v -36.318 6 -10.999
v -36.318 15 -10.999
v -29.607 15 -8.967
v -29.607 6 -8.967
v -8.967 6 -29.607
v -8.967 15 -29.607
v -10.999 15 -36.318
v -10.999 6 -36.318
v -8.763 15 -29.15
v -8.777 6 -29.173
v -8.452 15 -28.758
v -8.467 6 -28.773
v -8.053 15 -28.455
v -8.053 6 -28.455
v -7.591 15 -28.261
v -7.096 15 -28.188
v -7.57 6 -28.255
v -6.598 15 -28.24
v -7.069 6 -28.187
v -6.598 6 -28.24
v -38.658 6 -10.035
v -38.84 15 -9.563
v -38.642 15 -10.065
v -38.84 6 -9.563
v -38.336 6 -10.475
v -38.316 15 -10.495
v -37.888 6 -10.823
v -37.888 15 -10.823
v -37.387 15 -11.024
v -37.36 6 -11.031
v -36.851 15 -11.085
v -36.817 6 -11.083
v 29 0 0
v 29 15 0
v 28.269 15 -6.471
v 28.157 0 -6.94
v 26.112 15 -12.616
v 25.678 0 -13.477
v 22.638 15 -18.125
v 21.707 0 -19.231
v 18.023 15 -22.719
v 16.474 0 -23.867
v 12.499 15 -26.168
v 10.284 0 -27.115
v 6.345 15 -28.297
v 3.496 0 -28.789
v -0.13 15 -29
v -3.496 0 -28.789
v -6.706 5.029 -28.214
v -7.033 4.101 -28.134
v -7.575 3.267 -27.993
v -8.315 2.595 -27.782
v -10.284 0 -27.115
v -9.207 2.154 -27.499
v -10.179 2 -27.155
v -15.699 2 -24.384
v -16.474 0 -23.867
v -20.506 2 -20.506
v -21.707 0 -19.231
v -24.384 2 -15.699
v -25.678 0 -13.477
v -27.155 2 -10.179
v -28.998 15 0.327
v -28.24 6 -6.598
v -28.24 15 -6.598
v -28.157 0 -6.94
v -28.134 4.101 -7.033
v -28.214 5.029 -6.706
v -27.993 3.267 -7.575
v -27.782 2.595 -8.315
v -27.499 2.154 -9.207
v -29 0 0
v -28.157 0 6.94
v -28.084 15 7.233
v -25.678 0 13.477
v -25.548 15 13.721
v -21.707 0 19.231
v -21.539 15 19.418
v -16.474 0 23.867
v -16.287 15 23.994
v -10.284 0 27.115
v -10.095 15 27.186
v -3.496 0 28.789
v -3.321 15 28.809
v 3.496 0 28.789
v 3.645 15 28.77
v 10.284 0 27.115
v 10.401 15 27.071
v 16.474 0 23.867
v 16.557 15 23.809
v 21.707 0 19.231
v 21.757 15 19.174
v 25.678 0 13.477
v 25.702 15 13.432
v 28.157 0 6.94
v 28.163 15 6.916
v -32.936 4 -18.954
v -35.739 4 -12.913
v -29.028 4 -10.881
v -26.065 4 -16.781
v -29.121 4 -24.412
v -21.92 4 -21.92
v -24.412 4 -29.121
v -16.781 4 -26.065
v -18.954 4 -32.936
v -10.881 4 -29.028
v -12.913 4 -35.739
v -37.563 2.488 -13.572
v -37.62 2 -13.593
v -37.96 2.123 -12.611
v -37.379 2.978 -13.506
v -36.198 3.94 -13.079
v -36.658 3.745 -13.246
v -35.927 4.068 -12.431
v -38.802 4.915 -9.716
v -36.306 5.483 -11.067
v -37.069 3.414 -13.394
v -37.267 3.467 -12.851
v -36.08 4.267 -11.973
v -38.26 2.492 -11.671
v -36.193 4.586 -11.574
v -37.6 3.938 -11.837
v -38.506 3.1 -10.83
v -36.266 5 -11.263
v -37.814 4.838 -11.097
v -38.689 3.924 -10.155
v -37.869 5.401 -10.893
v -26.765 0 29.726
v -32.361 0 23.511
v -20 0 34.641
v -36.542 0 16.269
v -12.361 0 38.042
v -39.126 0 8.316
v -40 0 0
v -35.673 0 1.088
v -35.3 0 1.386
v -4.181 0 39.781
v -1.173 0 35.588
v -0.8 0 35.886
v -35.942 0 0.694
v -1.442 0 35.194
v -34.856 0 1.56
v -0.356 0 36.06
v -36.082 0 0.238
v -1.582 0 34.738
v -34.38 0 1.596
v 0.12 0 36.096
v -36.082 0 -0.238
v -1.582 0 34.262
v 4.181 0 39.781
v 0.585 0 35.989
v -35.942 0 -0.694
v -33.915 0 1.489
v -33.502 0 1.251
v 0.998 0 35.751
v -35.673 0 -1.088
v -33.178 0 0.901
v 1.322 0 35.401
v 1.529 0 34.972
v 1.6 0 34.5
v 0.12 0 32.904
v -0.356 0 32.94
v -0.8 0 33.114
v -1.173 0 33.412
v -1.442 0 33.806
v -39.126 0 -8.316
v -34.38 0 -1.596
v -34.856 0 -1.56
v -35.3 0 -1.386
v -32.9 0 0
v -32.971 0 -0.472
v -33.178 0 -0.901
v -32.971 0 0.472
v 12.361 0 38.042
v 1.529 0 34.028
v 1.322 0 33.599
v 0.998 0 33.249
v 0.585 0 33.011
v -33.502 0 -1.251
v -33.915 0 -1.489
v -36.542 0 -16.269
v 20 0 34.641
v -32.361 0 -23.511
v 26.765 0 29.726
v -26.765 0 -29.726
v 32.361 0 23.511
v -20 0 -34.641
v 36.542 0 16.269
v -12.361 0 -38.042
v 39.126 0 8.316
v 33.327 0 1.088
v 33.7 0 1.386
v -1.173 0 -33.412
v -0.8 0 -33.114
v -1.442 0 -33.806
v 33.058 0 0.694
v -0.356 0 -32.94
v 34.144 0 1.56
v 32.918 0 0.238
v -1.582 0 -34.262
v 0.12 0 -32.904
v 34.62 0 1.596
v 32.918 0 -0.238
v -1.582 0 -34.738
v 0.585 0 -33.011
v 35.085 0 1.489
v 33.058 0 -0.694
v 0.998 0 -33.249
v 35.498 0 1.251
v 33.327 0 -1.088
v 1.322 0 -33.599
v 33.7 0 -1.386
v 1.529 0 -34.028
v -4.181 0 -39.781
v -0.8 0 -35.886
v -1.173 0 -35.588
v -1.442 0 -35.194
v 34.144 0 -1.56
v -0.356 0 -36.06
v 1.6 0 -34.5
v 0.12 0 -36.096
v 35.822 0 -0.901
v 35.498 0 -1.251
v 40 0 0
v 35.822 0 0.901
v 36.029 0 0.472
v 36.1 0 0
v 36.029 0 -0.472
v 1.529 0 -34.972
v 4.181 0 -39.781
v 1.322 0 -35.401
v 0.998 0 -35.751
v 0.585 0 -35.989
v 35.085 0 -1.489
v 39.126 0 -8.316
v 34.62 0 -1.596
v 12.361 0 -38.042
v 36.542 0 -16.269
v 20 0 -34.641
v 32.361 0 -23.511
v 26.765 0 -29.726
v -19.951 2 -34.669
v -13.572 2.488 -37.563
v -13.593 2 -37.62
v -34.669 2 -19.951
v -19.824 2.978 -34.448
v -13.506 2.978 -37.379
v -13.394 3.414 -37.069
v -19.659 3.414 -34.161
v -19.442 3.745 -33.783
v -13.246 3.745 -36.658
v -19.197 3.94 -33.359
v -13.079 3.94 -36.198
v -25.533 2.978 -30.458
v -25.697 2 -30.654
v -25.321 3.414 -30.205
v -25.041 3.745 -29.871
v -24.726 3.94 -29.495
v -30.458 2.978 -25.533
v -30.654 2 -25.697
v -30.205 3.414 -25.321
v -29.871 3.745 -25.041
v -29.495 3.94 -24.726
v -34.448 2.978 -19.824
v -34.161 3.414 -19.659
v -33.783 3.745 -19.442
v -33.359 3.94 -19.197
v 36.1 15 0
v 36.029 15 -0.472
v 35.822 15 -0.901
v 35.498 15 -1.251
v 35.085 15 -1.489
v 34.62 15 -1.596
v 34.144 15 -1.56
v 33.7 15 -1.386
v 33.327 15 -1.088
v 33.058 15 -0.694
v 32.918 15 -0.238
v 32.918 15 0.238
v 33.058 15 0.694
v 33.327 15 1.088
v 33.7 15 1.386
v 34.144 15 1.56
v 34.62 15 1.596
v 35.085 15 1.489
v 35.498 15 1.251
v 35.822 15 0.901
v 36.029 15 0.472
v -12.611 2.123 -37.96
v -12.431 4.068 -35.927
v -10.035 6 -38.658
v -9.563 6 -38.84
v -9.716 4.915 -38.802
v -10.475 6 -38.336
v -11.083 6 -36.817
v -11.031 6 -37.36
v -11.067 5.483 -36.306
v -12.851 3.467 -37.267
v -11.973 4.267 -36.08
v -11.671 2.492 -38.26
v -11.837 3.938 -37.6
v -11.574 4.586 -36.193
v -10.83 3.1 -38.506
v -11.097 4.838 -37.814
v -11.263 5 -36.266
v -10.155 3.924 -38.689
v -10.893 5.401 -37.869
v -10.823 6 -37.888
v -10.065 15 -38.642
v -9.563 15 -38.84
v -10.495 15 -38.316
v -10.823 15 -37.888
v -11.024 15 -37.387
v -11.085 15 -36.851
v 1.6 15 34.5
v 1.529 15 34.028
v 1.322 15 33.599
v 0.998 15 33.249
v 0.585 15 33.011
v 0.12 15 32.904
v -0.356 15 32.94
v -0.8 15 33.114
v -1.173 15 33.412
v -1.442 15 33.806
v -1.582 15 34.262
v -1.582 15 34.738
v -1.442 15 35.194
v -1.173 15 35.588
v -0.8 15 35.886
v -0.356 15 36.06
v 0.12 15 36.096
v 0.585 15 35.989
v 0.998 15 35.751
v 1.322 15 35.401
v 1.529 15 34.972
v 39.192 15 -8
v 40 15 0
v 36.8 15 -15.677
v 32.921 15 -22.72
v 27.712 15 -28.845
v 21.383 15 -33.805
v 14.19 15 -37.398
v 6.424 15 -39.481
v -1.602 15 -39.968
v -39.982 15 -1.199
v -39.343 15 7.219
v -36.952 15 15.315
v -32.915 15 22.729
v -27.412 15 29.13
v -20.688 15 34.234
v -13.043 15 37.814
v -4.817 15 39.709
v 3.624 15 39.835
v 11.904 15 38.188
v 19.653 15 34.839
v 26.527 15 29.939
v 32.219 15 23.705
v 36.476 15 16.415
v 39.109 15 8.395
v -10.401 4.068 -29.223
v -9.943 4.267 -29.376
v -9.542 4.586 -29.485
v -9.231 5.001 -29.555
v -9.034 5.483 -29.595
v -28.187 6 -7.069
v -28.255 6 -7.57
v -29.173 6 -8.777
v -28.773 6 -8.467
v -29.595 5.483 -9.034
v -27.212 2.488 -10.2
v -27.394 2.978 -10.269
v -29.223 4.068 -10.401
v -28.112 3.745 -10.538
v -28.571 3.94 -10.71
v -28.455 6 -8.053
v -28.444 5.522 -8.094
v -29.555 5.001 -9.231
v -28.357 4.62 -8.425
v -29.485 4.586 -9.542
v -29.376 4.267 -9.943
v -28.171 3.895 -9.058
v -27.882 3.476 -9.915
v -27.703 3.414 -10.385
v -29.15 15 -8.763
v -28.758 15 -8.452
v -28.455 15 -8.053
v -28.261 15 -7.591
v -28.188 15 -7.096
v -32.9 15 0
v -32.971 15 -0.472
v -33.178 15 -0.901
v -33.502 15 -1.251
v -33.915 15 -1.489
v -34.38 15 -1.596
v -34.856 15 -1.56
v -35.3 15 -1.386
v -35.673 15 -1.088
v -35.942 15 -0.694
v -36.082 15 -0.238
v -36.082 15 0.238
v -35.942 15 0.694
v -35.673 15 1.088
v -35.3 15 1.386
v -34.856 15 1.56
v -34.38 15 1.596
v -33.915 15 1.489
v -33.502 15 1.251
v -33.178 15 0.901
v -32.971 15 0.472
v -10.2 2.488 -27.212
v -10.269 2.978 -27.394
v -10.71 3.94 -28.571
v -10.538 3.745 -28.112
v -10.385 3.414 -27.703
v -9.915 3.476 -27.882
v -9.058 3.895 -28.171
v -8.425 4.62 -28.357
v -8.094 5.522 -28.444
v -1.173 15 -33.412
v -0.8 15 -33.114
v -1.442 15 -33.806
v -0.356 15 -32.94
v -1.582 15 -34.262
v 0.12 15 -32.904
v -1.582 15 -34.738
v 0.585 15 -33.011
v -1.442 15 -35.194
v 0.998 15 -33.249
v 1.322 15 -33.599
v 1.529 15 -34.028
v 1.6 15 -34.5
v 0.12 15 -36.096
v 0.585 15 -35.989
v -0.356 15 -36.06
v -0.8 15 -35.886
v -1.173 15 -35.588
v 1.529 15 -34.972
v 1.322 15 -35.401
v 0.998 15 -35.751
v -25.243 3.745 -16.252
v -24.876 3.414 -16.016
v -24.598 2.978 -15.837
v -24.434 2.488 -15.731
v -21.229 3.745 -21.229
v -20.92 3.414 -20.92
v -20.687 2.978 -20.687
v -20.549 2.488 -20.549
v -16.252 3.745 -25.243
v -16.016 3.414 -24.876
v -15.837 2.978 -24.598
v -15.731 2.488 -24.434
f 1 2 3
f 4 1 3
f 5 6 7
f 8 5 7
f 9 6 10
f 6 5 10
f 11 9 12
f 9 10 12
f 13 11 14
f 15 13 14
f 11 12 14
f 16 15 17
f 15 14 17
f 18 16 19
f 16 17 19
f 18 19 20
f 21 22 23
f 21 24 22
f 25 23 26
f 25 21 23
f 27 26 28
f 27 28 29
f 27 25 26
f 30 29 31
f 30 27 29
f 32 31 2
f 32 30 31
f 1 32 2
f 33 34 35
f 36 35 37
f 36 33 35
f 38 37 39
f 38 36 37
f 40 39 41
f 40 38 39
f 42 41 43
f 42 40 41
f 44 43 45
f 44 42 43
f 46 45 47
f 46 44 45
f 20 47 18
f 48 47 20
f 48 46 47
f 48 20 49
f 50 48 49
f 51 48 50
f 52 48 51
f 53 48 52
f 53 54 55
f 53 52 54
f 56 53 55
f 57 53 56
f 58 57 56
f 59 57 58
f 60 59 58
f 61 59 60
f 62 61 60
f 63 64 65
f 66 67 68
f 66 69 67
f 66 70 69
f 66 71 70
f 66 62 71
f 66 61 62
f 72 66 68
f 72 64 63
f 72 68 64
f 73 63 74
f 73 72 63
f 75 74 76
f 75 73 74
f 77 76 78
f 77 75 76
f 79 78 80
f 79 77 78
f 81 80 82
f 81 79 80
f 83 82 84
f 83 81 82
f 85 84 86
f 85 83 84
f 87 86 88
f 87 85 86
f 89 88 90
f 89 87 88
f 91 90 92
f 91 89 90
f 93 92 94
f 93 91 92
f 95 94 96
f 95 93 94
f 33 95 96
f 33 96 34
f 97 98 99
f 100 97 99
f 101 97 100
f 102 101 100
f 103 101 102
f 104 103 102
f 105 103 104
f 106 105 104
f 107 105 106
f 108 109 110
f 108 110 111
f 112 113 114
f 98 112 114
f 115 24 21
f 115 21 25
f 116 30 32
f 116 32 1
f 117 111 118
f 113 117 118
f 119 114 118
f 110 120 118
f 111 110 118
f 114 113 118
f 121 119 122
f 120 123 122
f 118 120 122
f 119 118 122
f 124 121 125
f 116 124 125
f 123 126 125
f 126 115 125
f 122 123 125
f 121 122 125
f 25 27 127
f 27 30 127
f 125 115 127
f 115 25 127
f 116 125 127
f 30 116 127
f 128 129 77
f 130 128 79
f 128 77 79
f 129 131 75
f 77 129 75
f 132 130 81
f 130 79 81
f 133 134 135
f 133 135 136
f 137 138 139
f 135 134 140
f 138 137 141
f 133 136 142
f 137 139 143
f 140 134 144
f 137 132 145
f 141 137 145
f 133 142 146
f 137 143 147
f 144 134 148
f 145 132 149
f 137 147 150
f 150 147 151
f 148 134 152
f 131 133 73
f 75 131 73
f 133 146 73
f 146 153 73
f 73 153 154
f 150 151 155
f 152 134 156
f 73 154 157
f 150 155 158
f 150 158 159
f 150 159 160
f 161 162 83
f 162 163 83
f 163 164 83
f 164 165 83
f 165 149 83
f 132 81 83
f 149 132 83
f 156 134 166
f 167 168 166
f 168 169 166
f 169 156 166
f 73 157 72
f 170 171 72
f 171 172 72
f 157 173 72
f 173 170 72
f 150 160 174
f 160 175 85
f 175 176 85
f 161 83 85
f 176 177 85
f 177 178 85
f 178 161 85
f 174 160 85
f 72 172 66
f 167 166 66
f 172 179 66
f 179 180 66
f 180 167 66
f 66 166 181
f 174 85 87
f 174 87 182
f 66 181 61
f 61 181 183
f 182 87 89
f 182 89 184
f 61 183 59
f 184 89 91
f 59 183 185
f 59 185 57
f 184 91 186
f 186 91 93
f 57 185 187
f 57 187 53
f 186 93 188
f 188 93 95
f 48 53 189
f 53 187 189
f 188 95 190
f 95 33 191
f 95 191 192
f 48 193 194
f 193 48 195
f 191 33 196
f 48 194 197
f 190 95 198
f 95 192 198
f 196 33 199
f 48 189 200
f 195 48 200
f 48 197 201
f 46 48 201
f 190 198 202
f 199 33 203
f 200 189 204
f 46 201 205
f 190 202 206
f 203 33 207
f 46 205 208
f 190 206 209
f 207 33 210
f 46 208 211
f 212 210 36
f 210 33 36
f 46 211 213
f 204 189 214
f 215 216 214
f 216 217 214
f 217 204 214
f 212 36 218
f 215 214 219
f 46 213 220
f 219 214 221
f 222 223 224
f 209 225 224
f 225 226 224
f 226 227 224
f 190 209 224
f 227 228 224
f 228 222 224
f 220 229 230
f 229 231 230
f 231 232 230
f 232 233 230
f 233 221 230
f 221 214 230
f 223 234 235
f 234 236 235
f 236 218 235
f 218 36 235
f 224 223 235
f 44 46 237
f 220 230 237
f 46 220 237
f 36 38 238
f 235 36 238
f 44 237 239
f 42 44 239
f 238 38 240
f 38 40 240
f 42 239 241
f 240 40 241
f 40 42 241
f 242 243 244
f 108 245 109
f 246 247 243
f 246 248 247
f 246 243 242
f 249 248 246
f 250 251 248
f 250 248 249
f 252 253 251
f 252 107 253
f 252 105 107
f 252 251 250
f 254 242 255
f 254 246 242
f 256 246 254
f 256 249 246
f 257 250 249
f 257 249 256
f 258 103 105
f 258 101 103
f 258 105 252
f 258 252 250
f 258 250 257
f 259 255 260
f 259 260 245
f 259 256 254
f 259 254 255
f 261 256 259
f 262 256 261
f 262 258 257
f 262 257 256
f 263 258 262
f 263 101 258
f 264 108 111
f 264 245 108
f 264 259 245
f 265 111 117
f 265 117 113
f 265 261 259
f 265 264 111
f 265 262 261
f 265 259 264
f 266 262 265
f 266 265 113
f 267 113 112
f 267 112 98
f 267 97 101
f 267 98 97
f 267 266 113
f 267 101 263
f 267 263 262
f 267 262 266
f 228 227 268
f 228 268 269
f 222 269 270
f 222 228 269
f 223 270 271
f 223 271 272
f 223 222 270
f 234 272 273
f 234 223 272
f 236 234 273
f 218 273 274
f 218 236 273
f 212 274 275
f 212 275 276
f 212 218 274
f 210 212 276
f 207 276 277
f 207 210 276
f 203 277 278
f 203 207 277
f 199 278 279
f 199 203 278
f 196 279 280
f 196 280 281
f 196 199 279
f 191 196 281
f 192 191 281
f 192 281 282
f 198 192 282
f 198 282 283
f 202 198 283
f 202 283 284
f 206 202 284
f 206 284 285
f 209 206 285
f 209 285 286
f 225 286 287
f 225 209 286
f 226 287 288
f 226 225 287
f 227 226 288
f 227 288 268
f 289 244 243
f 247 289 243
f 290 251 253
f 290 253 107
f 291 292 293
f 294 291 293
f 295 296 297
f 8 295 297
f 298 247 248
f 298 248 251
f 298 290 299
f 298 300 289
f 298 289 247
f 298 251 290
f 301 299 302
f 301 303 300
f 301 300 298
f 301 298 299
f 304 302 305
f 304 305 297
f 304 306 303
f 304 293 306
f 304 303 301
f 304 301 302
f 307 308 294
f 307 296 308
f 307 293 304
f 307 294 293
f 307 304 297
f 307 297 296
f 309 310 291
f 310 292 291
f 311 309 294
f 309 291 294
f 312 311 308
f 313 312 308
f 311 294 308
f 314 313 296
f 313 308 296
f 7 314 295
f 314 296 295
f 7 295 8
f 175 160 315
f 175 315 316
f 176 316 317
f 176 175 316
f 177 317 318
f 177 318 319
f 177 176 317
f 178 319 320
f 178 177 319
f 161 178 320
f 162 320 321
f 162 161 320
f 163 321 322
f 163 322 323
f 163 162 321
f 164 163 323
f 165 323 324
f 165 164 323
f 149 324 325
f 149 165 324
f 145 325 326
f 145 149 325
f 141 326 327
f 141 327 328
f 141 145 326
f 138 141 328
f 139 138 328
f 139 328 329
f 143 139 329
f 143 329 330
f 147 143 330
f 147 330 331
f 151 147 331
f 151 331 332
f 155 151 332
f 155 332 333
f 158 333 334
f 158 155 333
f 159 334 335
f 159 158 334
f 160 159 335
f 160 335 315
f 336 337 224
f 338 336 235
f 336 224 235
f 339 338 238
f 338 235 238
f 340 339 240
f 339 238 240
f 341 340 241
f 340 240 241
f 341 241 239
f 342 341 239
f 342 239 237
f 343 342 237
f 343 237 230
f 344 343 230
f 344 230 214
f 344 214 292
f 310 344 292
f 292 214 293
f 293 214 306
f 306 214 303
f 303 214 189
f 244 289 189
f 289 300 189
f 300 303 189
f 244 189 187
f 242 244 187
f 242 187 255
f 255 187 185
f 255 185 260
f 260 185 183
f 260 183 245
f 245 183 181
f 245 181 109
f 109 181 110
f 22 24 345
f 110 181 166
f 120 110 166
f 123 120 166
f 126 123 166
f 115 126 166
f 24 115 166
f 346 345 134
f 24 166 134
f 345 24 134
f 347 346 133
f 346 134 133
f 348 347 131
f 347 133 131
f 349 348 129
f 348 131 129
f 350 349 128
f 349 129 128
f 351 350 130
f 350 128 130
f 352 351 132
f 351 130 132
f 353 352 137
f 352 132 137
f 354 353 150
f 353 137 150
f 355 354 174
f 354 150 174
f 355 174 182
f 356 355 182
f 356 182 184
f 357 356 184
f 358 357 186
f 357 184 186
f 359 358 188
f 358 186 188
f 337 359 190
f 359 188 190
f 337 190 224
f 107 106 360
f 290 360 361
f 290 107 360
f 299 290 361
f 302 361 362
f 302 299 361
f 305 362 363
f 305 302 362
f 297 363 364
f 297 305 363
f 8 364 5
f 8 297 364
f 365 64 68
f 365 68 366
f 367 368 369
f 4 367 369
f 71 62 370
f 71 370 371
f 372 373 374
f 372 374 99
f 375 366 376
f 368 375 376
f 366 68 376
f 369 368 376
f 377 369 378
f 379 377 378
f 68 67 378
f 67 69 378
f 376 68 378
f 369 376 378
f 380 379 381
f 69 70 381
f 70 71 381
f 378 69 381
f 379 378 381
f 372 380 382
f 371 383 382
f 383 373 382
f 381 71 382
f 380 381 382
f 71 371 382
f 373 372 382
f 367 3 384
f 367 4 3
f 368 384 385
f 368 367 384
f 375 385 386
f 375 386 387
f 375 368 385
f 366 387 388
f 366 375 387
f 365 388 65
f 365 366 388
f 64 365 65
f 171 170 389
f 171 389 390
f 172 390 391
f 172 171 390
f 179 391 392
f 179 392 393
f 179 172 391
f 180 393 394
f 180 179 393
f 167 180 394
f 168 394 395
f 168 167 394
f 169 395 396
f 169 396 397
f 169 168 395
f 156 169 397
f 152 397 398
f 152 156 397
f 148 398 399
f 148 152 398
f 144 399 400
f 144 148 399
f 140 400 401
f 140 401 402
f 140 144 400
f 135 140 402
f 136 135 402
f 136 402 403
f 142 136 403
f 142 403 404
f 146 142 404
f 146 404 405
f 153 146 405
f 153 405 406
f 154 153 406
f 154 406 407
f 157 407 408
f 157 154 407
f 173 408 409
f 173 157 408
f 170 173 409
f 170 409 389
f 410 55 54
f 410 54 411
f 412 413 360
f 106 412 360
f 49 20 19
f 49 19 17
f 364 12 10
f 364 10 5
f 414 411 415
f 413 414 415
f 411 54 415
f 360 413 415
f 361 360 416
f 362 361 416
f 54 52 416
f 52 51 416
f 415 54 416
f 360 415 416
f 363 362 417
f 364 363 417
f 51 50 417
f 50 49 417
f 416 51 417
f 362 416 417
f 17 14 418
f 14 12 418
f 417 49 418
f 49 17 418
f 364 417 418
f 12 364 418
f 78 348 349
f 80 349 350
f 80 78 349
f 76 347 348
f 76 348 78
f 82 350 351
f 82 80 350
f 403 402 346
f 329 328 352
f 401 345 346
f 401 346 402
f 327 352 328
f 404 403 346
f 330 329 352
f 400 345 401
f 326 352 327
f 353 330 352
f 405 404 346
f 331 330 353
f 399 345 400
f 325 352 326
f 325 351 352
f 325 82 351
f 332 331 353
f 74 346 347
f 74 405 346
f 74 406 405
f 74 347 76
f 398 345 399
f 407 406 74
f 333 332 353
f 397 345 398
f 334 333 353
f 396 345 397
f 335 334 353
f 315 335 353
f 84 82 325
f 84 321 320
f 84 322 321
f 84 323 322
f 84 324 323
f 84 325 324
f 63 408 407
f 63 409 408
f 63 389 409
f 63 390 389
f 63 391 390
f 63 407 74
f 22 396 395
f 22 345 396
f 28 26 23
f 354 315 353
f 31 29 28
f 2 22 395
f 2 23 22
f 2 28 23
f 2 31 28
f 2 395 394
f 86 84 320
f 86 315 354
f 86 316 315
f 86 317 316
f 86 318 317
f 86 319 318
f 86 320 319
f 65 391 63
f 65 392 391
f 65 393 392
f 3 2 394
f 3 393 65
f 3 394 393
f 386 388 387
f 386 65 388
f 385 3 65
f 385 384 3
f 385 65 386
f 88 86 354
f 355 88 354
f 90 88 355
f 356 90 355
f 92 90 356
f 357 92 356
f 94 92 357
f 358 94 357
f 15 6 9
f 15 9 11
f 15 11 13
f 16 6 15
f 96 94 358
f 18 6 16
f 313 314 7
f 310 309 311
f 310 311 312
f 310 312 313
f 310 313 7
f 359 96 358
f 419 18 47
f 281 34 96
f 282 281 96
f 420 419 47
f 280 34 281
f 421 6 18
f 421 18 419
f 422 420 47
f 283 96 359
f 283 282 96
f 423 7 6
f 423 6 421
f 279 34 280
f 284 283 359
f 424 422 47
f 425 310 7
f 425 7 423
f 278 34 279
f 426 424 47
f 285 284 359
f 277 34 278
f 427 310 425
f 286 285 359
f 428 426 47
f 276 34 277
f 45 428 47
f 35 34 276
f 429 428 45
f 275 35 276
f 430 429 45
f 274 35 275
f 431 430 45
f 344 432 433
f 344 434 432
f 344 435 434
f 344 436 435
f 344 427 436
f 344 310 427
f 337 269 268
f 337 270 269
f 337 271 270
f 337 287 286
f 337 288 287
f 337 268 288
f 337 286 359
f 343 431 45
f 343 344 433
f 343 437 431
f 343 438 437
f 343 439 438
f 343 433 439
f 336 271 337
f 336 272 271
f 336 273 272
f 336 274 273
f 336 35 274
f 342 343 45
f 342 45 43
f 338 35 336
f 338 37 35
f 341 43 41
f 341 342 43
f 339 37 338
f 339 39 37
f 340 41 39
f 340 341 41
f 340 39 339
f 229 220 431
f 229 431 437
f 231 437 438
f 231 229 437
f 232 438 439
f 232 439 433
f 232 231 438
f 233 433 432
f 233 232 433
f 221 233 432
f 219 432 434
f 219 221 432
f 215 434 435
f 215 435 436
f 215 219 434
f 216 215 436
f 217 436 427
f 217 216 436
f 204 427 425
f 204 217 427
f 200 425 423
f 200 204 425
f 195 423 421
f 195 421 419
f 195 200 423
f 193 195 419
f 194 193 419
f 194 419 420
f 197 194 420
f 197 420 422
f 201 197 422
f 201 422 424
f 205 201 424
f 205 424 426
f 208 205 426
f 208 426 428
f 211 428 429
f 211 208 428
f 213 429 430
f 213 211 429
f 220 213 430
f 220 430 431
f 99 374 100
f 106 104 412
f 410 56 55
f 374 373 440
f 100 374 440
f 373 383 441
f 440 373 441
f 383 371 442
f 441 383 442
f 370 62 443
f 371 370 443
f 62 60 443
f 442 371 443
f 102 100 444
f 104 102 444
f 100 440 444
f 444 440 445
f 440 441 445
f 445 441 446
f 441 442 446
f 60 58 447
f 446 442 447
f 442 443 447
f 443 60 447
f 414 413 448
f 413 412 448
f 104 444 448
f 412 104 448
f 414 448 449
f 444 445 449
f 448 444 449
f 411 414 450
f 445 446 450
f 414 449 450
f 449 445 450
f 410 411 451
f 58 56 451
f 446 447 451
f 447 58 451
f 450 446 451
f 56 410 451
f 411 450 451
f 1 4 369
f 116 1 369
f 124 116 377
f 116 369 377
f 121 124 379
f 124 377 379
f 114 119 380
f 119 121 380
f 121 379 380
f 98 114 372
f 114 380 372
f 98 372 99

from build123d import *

# Parameters (mm, degrees)
SKETCH_1_R          = 40
SKETCH_1_R_2        = 29
SKETCH_1_R_3        = 1.6
EXTRUDE_1_DEPTH     = 15
CUT_EXTRUDE_1_DEPTH = 11
FILLET_1_R          = 2


with BuildPart() as part:
    # 草图1 → 凸台-拉伸1 (new body)
    with BuildSketch(Plane(origin=(0, 0, 0), x_dir=(1, 0, 0), z_dir=(0, 1, 0))):
        Circle(SKETCH_1_R)
        Circle(SKETCH_1_R_2, mode=Mode.SUBTRACT)
        with Locations((0, 34.5)):
            Circle(SKETCH_1_R_3, mode=Mode.SUBTRACT)
        with Locations((34.5, 0)):
            Circle(SKETCH_1_R_3, mode=Mode.SUBTRACT)
        with Locations((-34.5, 0)):
            Circle(SKETCH_1_R_3, mode=Mode.SUBTRACT)
        with Locations((0, -34.5)):
            Circle(SKETCH_1_R_3, mode=Mode.SUBTRACT)
    extrude(amount=EXTRUDE_1_DEPTH)

    # 草图2 → 切除-拉伸1 (cut)
    with BuildSketch(Plane(origin=(0, 15, 0), x_dir=(1, 0, 0), z_dir=(0, 1, 0))):
        with BuildLine():
            Line((-8.405801697, 27.755044548), (-11.594209237, 38.282820066))
            ThreePointArc((-11.594209237, 38.282820066), (-28.284271247, 28.284271247), (-38.282820066, 11.594209237))
            Line((-38.282820066, 11.594209237), (-27.755044548, 8.405801697))
            ThreePointArc((-27.755044548, 8.405801697), (-20.506096654, 20.506096654), (-8.405801697, 27.755044548))
        make_face()
    extrude(amount=-CUT_EXTRUDE_1_DEPTH, mode=Mode.SUBTRACT)

    # 圆角1
    fillet_1_edges = [part.edges().sort_by_distance(p)[0] for p in [
        (-28.284271247, 4, -28.284271247),
        (-38.282820066, 9.5, -11.594209237),
        (-11.594209237, 9.5, -38.282820066),
        (-20.506096654, 4, -20.506096654),
        (-8.405801697, 9.5, -27.755044548),
        (-33.018932307, 4, -10.000005467),
        (-27.755044548, 9.5, -8.405801697),
        (-10.000005467, 4, -33.018932307),
    ]]
    fillet(fillet_1_edges, radius=FILLET_1_R)


solid = part.part
